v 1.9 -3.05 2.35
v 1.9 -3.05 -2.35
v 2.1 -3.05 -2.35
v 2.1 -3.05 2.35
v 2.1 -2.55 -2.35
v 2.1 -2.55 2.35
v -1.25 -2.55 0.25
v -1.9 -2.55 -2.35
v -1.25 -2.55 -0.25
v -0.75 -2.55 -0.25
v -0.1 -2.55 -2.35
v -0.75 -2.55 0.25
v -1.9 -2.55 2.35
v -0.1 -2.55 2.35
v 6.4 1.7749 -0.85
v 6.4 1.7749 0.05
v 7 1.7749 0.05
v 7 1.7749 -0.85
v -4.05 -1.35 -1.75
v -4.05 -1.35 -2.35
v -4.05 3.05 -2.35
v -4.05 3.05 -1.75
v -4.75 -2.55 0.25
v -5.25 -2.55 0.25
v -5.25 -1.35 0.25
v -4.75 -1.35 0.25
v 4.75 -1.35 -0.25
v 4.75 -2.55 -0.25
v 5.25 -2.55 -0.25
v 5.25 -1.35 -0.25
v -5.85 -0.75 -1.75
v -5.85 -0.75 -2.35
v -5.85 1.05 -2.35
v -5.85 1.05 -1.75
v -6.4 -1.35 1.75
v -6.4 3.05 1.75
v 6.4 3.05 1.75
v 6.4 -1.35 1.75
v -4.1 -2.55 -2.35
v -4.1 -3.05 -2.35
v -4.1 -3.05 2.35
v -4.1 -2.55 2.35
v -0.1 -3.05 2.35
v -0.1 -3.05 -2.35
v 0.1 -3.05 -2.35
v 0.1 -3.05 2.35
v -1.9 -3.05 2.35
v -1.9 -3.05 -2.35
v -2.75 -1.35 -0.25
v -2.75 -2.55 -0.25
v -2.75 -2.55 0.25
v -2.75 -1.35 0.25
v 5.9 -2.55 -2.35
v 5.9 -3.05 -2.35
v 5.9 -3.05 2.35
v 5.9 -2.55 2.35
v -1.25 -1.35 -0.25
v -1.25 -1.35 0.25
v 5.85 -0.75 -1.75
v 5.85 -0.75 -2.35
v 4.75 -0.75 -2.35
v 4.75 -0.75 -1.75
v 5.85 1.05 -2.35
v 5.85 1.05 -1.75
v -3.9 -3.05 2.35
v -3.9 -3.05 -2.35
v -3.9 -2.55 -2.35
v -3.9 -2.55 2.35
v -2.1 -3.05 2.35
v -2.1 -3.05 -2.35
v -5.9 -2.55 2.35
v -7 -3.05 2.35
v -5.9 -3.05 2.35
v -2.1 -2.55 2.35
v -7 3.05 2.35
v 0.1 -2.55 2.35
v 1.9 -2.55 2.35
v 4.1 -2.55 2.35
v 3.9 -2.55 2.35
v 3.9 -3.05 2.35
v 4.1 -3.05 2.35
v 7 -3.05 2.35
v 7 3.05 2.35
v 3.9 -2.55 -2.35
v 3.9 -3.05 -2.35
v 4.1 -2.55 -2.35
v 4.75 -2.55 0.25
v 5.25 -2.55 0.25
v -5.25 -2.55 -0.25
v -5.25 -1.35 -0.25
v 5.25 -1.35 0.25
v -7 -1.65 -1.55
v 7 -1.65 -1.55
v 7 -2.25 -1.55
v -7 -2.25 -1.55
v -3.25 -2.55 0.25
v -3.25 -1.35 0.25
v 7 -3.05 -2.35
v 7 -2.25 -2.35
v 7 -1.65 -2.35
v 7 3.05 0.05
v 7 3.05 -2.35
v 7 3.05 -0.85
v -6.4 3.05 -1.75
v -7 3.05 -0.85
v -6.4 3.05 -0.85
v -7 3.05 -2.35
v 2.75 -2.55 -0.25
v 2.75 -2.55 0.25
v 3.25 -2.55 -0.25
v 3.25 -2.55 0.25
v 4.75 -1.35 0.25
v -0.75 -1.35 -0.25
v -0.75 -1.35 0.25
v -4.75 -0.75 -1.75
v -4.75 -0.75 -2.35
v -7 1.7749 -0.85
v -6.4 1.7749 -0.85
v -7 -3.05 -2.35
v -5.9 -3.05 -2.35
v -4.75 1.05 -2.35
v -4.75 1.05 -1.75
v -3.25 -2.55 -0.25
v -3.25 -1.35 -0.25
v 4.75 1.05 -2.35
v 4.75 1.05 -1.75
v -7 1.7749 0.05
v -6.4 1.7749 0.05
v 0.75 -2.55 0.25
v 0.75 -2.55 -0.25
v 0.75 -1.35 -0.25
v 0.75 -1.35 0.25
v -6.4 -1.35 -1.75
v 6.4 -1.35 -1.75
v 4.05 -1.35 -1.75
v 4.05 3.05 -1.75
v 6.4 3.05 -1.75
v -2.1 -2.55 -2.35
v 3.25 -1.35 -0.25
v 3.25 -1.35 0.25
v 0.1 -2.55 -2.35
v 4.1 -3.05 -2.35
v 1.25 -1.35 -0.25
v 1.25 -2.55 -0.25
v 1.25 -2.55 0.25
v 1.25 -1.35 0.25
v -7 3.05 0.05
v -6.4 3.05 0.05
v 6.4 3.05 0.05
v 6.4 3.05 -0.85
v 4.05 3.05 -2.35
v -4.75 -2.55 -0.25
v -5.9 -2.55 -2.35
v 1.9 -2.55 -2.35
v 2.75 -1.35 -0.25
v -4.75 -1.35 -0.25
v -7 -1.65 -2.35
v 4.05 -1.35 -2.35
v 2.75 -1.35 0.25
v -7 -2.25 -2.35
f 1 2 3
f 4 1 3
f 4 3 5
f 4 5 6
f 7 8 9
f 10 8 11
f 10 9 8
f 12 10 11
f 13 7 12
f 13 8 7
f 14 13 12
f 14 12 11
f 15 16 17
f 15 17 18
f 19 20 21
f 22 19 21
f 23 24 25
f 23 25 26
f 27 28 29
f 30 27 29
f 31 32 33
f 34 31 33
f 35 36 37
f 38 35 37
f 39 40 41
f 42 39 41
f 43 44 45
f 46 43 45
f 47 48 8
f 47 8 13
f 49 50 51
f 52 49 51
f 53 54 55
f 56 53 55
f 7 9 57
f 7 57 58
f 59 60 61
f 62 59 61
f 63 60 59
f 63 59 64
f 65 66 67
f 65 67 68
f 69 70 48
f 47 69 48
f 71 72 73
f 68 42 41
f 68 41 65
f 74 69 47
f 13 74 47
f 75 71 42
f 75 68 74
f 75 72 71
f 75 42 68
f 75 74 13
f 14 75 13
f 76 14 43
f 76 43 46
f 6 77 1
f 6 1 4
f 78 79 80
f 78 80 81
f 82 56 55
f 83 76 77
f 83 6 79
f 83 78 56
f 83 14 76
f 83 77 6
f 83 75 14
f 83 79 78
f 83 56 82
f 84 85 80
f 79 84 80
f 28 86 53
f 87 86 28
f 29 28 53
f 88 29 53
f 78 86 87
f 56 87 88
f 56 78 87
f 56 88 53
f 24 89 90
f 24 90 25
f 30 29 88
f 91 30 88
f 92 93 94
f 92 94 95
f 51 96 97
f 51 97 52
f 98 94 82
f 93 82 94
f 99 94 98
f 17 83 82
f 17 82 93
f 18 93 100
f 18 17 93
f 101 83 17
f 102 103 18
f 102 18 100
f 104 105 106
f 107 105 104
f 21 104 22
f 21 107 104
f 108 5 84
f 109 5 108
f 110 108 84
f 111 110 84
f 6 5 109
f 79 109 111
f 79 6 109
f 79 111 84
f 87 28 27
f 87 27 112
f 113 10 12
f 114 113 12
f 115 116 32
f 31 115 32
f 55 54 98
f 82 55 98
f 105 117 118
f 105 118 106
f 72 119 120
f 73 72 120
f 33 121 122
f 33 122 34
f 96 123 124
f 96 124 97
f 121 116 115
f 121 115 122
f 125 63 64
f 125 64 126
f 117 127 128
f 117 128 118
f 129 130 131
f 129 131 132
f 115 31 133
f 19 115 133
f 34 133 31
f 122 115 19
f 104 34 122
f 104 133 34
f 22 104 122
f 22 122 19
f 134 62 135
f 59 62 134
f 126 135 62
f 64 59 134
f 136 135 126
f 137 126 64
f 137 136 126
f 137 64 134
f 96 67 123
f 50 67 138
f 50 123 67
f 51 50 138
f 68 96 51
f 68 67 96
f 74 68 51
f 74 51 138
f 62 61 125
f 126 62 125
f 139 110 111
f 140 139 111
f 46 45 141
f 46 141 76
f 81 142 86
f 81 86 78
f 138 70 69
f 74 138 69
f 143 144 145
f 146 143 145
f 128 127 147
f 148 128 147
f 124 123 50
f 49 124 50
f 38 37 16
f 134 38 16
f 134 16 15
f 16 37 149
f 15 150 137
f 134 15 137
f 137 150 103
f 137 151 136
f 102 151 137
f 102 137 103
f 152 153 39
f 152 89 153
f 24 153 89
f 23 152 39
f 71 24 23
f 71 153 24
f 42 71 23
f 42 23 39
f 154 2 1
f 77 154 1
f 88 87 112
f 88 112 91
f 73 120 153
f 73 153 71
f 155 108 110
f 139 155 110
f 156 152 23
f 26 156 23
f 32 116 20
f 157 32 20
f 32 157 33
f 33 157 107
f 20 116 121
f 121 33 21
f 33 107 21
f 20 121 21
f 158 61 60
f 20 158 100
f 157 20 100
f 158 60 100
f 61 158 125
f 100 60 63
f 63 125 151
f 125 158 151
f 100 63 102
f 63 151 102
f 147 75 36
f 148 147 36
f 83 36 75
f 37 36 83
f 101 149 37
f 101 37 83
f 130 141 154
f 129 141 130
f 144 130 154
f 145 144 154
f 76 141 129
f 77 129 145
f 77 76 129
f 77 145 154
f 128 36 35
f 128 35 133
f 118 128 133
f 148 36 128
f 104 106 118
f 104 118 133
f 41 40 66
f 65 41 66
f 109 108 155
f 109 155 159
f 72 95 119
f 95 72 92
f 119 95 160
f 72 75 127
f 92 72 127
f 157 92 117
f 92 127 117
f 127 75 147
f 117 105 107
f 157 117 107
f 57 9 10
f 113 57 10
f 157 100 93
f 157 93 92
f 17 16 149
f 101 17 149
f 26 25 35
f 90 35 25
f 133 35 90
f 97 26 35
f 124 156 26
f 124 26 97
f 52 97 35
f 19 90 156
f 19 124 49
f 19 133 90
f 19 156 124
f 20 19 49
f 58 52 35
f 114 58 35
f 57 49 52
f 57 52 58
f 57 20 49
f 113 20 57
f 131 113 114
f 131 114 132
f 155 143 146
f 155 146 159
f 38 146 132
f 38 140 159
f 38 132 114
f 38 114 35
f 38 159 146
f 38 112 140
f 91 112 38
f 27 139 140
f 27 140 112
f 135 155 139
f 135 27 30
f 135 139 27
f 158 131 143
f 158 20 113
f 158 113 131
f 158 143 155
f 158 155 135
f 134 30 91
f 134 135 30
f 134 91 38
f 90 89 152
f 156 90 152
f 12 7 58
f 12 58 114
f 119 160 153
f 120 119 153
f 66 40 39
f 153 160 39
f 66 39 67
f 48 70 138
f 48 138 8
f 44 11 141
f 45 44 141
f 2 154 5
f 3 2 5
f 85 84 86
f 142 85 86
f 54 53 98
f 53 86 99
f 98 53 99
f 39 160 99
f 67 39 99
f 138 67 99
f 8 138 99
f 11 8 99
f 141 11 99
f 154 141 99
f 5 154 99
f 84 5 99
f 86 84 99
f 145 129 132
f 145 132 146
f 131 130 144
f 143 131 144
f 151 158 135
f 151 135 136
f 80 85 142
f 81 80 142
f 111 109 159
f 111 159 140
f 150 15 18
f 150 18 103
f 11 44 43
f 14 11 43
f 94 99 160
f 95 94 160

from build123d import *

# Parameters (mm, degrees)
ESBO_O1_W                  = 14
ESBO_O1_H                  = 4.7
RESSALTO_EXTRUS_O1_DEPTH   = 3.05
CASCA1_T                   = -0.6
ESBO_O2_W                  = 8.1
ESBO_O2_H                  = 4.4
ESBO_O2_W_2                = 1.1
ESBO_O2_H_2                = 1.8
CORTE_EXTRUS_O1_DEPTH      = 0.6
ESBO_O3_W                  = 12.8
ESBO_O3_H                  = 3.5
RESSALTO_EXTRUS_O2_DEPTH   = 1.1
ESBO_O4_W                  = 14
ESBO_O4_H                  = 0.6
CORTE_EXTRUS_O2_DEPTH      = 0.8
CORTE_EXTRUS_O3_DEPTH      = 15.519814048
CORTE_EXTRUS_O3_DEPTH_BACK = 15.519814048
ESBO_O5_W                  = 0.9
ESBO_O5_H                  = 1.275071612
ESBO_O8_W                  = 0.5
ESBO_O8_H                  = 0.5
CORTE_EXTRUS_O5_DEPTH      = 10.577708494
ESBO_O9_W                  = 1.8
ESBO_O9_H                  = 4.707525417
ESBO_O9_H_2                = 4.692474583
CORTE_EXTRUS_O6_DEPTH      = 0.5
ESBO_O10_W                 = 1.8
ESBO_O10_H                 = 0.5
CORTE_EXTRUS_O7_DEPTH      = 9.962244011


with BuildPart() as part:
    # Esboço1 → Ressalto-extrusão1 (new, symmetric)
    with BuildSketch(Plane(origin=(0, 0, 0), x_dir=(1, 0, 0), z_dir=(0, 1, 0))):
        Rectangle(ESBO_O1_W, ESBO_O1_H)
    extrude(amount=RESSALTO_EXTRUS_O1_DEPTH, both=True)

    # Casca1
    casca1_openings = [part.faces().sort_by_distance(p)[0] for p in [
        (0, 3.05, 0),
    ]]
    offset(amount=CASCA1_T, openings=casca1_openings, kind=Kind.INTERSECTION)

    # Esboço2 → Corte-extrusão1 (cut)
    with BuildSketch(Plane(origin=(0, 0, -2.35), x_dir=(-1, 0, 0), z_dir=(0, 0, -1))):
        with Locations((0, 0.85)):
            Rectangle(ESBO_O2_W, ESBO_O2_H)
        with Locations((5.3, 0.15)):
            Rectangle(ESBO_O2_W_2, ESBO_O2_H_2)
        with Locations((-5.3, 0.15)):
            Rectangle(ESBO_O2_W_2, ESBO_O2_H_2)
    extrude(amount=-CORTE_EXTRUS_O1_DEPTH, mode=Mode.SUBTRACT)

    # Esboço3 → Ressalto-extrusão2 (add)
    with BuildSketch(Plane(origin=(0, -2.45, 0), x_dir=(1, 0, 0), z_dir=(0, 1, 0))):
        Rectangle(ESBO_O3_W, ESBO_O3_H)
    extrude(amount=RESSALTO_EXTRUS_O2_DEPTH)

    # Esboço4 → Corte-extrusão2 (cut)
    with BuildSketch(Plane(origin=(0, 0, -2.35), x_dir=(-1, 0, 0), z_dir=(0, 0, -1))):
        with Locations((0, -1.95)):
            Rectangle(ESBO_O4_W, ESBO_O4_H)
    extrude(amount=-CORTE_EXTRUS_O2_DEPTH, mode=Mode.SUBTRACT)

    # Esboço5 → Corte-extrusão3 (cut, two sides: drawn at the far end of the back side and taken through both)
    with BuildSketch(Plane(origin=(7, 0, 0), x_dir=(0, 0, -1), z_dir=(1, 0, 0)).offset(-CORTE_EXTRUS_O3_DEPTH_BACK)):
        with Locations((0.4, 2.412464194)):
            Rectangle(ESBO_O5_W, ESBO_O5_H)
    extrude(amount=CORTE_EXTRUS_O3_DEPTH + CORTE_EXTRUS_O3_DEPTH_BACK, mode=Mode.SUBTRACT)

    # Esboço8 → Corte-extrusão5 (cut, through all)
    with BuildSketch(Plane.XZ.offset(3.05)):
        with Locations((-3, 0)):
            Rectangle(ESBO_O8_W, ESBO_O8_H)
        with Locations((-5, 0)):
            Rectangle(ESBO_O8_W, ESBO_O8_H)
        with Locations((-1, 0)):
            Rectangle(ESBO_O8_W, ESBO_O8_H)
        with Locations((1, 0)):
            Rectangle(ESBO_O8_W, ESBO_O8_H)
        with Locations((3, 0)):
            Rectangle(ESBO_O8_W, ESBO_O8_H)
        with Locations((5, 0)):
            Rectangle(ESBO_O8_W, ESBO_O8_H)
    extrude(amount=-CORTE_EXTRUS_O5_DEPTH, mode=Mode.SUBTRACT)

    # Esboço9 → Corte-extrusão6 (cut)
    with BuildSketch(Plane.XZ.offset(3.05)):
        with Locations((-4.999992921, 0.003762709)):
            Rectangle(ESBO_O9_W, ESBO_O9_H)
        with Locations((-2.999992921, 0.003762709)):
            Rectangle(ESBO_O9_W, ESBO_O9_H)
        with Locations((-0.999992921, 0.003762709)):
            Rectangle(ESBO_O9_W, ESBO_O9_H)
        with Locations((0.999992921, 0.003762709)):
            Rectangle(ESBO_O9_W, ESBO_O9_H)
        with Locations((2.999992921, 0.003762709)):
            Rectangle(ESBO_O9_W, ESBO_O9_H)
        with Locations((4.999992921, 0.003762709)):
            Rectangle(ESBO_O9_W, ESBO_O9_H_2)
    extrude(amount=-CORTE_EXTRUS_O6_DEPTH, mode=Mode.SUBTRACT)

    # Esboço10 → Corte-extrusão7 (cut, through all)
    with BuildSketch(Plane.XY.offset(-2.342474583)):
        with Locations((4.999992921, -2.8)):
            Rectangle(ESBO_O10_W, ESBO_O10_H)
    extrude(amount=-CORTE_EXTRUS_O7_DEPTH, mode=Mode.SUBTRACT)


solid = part.part
